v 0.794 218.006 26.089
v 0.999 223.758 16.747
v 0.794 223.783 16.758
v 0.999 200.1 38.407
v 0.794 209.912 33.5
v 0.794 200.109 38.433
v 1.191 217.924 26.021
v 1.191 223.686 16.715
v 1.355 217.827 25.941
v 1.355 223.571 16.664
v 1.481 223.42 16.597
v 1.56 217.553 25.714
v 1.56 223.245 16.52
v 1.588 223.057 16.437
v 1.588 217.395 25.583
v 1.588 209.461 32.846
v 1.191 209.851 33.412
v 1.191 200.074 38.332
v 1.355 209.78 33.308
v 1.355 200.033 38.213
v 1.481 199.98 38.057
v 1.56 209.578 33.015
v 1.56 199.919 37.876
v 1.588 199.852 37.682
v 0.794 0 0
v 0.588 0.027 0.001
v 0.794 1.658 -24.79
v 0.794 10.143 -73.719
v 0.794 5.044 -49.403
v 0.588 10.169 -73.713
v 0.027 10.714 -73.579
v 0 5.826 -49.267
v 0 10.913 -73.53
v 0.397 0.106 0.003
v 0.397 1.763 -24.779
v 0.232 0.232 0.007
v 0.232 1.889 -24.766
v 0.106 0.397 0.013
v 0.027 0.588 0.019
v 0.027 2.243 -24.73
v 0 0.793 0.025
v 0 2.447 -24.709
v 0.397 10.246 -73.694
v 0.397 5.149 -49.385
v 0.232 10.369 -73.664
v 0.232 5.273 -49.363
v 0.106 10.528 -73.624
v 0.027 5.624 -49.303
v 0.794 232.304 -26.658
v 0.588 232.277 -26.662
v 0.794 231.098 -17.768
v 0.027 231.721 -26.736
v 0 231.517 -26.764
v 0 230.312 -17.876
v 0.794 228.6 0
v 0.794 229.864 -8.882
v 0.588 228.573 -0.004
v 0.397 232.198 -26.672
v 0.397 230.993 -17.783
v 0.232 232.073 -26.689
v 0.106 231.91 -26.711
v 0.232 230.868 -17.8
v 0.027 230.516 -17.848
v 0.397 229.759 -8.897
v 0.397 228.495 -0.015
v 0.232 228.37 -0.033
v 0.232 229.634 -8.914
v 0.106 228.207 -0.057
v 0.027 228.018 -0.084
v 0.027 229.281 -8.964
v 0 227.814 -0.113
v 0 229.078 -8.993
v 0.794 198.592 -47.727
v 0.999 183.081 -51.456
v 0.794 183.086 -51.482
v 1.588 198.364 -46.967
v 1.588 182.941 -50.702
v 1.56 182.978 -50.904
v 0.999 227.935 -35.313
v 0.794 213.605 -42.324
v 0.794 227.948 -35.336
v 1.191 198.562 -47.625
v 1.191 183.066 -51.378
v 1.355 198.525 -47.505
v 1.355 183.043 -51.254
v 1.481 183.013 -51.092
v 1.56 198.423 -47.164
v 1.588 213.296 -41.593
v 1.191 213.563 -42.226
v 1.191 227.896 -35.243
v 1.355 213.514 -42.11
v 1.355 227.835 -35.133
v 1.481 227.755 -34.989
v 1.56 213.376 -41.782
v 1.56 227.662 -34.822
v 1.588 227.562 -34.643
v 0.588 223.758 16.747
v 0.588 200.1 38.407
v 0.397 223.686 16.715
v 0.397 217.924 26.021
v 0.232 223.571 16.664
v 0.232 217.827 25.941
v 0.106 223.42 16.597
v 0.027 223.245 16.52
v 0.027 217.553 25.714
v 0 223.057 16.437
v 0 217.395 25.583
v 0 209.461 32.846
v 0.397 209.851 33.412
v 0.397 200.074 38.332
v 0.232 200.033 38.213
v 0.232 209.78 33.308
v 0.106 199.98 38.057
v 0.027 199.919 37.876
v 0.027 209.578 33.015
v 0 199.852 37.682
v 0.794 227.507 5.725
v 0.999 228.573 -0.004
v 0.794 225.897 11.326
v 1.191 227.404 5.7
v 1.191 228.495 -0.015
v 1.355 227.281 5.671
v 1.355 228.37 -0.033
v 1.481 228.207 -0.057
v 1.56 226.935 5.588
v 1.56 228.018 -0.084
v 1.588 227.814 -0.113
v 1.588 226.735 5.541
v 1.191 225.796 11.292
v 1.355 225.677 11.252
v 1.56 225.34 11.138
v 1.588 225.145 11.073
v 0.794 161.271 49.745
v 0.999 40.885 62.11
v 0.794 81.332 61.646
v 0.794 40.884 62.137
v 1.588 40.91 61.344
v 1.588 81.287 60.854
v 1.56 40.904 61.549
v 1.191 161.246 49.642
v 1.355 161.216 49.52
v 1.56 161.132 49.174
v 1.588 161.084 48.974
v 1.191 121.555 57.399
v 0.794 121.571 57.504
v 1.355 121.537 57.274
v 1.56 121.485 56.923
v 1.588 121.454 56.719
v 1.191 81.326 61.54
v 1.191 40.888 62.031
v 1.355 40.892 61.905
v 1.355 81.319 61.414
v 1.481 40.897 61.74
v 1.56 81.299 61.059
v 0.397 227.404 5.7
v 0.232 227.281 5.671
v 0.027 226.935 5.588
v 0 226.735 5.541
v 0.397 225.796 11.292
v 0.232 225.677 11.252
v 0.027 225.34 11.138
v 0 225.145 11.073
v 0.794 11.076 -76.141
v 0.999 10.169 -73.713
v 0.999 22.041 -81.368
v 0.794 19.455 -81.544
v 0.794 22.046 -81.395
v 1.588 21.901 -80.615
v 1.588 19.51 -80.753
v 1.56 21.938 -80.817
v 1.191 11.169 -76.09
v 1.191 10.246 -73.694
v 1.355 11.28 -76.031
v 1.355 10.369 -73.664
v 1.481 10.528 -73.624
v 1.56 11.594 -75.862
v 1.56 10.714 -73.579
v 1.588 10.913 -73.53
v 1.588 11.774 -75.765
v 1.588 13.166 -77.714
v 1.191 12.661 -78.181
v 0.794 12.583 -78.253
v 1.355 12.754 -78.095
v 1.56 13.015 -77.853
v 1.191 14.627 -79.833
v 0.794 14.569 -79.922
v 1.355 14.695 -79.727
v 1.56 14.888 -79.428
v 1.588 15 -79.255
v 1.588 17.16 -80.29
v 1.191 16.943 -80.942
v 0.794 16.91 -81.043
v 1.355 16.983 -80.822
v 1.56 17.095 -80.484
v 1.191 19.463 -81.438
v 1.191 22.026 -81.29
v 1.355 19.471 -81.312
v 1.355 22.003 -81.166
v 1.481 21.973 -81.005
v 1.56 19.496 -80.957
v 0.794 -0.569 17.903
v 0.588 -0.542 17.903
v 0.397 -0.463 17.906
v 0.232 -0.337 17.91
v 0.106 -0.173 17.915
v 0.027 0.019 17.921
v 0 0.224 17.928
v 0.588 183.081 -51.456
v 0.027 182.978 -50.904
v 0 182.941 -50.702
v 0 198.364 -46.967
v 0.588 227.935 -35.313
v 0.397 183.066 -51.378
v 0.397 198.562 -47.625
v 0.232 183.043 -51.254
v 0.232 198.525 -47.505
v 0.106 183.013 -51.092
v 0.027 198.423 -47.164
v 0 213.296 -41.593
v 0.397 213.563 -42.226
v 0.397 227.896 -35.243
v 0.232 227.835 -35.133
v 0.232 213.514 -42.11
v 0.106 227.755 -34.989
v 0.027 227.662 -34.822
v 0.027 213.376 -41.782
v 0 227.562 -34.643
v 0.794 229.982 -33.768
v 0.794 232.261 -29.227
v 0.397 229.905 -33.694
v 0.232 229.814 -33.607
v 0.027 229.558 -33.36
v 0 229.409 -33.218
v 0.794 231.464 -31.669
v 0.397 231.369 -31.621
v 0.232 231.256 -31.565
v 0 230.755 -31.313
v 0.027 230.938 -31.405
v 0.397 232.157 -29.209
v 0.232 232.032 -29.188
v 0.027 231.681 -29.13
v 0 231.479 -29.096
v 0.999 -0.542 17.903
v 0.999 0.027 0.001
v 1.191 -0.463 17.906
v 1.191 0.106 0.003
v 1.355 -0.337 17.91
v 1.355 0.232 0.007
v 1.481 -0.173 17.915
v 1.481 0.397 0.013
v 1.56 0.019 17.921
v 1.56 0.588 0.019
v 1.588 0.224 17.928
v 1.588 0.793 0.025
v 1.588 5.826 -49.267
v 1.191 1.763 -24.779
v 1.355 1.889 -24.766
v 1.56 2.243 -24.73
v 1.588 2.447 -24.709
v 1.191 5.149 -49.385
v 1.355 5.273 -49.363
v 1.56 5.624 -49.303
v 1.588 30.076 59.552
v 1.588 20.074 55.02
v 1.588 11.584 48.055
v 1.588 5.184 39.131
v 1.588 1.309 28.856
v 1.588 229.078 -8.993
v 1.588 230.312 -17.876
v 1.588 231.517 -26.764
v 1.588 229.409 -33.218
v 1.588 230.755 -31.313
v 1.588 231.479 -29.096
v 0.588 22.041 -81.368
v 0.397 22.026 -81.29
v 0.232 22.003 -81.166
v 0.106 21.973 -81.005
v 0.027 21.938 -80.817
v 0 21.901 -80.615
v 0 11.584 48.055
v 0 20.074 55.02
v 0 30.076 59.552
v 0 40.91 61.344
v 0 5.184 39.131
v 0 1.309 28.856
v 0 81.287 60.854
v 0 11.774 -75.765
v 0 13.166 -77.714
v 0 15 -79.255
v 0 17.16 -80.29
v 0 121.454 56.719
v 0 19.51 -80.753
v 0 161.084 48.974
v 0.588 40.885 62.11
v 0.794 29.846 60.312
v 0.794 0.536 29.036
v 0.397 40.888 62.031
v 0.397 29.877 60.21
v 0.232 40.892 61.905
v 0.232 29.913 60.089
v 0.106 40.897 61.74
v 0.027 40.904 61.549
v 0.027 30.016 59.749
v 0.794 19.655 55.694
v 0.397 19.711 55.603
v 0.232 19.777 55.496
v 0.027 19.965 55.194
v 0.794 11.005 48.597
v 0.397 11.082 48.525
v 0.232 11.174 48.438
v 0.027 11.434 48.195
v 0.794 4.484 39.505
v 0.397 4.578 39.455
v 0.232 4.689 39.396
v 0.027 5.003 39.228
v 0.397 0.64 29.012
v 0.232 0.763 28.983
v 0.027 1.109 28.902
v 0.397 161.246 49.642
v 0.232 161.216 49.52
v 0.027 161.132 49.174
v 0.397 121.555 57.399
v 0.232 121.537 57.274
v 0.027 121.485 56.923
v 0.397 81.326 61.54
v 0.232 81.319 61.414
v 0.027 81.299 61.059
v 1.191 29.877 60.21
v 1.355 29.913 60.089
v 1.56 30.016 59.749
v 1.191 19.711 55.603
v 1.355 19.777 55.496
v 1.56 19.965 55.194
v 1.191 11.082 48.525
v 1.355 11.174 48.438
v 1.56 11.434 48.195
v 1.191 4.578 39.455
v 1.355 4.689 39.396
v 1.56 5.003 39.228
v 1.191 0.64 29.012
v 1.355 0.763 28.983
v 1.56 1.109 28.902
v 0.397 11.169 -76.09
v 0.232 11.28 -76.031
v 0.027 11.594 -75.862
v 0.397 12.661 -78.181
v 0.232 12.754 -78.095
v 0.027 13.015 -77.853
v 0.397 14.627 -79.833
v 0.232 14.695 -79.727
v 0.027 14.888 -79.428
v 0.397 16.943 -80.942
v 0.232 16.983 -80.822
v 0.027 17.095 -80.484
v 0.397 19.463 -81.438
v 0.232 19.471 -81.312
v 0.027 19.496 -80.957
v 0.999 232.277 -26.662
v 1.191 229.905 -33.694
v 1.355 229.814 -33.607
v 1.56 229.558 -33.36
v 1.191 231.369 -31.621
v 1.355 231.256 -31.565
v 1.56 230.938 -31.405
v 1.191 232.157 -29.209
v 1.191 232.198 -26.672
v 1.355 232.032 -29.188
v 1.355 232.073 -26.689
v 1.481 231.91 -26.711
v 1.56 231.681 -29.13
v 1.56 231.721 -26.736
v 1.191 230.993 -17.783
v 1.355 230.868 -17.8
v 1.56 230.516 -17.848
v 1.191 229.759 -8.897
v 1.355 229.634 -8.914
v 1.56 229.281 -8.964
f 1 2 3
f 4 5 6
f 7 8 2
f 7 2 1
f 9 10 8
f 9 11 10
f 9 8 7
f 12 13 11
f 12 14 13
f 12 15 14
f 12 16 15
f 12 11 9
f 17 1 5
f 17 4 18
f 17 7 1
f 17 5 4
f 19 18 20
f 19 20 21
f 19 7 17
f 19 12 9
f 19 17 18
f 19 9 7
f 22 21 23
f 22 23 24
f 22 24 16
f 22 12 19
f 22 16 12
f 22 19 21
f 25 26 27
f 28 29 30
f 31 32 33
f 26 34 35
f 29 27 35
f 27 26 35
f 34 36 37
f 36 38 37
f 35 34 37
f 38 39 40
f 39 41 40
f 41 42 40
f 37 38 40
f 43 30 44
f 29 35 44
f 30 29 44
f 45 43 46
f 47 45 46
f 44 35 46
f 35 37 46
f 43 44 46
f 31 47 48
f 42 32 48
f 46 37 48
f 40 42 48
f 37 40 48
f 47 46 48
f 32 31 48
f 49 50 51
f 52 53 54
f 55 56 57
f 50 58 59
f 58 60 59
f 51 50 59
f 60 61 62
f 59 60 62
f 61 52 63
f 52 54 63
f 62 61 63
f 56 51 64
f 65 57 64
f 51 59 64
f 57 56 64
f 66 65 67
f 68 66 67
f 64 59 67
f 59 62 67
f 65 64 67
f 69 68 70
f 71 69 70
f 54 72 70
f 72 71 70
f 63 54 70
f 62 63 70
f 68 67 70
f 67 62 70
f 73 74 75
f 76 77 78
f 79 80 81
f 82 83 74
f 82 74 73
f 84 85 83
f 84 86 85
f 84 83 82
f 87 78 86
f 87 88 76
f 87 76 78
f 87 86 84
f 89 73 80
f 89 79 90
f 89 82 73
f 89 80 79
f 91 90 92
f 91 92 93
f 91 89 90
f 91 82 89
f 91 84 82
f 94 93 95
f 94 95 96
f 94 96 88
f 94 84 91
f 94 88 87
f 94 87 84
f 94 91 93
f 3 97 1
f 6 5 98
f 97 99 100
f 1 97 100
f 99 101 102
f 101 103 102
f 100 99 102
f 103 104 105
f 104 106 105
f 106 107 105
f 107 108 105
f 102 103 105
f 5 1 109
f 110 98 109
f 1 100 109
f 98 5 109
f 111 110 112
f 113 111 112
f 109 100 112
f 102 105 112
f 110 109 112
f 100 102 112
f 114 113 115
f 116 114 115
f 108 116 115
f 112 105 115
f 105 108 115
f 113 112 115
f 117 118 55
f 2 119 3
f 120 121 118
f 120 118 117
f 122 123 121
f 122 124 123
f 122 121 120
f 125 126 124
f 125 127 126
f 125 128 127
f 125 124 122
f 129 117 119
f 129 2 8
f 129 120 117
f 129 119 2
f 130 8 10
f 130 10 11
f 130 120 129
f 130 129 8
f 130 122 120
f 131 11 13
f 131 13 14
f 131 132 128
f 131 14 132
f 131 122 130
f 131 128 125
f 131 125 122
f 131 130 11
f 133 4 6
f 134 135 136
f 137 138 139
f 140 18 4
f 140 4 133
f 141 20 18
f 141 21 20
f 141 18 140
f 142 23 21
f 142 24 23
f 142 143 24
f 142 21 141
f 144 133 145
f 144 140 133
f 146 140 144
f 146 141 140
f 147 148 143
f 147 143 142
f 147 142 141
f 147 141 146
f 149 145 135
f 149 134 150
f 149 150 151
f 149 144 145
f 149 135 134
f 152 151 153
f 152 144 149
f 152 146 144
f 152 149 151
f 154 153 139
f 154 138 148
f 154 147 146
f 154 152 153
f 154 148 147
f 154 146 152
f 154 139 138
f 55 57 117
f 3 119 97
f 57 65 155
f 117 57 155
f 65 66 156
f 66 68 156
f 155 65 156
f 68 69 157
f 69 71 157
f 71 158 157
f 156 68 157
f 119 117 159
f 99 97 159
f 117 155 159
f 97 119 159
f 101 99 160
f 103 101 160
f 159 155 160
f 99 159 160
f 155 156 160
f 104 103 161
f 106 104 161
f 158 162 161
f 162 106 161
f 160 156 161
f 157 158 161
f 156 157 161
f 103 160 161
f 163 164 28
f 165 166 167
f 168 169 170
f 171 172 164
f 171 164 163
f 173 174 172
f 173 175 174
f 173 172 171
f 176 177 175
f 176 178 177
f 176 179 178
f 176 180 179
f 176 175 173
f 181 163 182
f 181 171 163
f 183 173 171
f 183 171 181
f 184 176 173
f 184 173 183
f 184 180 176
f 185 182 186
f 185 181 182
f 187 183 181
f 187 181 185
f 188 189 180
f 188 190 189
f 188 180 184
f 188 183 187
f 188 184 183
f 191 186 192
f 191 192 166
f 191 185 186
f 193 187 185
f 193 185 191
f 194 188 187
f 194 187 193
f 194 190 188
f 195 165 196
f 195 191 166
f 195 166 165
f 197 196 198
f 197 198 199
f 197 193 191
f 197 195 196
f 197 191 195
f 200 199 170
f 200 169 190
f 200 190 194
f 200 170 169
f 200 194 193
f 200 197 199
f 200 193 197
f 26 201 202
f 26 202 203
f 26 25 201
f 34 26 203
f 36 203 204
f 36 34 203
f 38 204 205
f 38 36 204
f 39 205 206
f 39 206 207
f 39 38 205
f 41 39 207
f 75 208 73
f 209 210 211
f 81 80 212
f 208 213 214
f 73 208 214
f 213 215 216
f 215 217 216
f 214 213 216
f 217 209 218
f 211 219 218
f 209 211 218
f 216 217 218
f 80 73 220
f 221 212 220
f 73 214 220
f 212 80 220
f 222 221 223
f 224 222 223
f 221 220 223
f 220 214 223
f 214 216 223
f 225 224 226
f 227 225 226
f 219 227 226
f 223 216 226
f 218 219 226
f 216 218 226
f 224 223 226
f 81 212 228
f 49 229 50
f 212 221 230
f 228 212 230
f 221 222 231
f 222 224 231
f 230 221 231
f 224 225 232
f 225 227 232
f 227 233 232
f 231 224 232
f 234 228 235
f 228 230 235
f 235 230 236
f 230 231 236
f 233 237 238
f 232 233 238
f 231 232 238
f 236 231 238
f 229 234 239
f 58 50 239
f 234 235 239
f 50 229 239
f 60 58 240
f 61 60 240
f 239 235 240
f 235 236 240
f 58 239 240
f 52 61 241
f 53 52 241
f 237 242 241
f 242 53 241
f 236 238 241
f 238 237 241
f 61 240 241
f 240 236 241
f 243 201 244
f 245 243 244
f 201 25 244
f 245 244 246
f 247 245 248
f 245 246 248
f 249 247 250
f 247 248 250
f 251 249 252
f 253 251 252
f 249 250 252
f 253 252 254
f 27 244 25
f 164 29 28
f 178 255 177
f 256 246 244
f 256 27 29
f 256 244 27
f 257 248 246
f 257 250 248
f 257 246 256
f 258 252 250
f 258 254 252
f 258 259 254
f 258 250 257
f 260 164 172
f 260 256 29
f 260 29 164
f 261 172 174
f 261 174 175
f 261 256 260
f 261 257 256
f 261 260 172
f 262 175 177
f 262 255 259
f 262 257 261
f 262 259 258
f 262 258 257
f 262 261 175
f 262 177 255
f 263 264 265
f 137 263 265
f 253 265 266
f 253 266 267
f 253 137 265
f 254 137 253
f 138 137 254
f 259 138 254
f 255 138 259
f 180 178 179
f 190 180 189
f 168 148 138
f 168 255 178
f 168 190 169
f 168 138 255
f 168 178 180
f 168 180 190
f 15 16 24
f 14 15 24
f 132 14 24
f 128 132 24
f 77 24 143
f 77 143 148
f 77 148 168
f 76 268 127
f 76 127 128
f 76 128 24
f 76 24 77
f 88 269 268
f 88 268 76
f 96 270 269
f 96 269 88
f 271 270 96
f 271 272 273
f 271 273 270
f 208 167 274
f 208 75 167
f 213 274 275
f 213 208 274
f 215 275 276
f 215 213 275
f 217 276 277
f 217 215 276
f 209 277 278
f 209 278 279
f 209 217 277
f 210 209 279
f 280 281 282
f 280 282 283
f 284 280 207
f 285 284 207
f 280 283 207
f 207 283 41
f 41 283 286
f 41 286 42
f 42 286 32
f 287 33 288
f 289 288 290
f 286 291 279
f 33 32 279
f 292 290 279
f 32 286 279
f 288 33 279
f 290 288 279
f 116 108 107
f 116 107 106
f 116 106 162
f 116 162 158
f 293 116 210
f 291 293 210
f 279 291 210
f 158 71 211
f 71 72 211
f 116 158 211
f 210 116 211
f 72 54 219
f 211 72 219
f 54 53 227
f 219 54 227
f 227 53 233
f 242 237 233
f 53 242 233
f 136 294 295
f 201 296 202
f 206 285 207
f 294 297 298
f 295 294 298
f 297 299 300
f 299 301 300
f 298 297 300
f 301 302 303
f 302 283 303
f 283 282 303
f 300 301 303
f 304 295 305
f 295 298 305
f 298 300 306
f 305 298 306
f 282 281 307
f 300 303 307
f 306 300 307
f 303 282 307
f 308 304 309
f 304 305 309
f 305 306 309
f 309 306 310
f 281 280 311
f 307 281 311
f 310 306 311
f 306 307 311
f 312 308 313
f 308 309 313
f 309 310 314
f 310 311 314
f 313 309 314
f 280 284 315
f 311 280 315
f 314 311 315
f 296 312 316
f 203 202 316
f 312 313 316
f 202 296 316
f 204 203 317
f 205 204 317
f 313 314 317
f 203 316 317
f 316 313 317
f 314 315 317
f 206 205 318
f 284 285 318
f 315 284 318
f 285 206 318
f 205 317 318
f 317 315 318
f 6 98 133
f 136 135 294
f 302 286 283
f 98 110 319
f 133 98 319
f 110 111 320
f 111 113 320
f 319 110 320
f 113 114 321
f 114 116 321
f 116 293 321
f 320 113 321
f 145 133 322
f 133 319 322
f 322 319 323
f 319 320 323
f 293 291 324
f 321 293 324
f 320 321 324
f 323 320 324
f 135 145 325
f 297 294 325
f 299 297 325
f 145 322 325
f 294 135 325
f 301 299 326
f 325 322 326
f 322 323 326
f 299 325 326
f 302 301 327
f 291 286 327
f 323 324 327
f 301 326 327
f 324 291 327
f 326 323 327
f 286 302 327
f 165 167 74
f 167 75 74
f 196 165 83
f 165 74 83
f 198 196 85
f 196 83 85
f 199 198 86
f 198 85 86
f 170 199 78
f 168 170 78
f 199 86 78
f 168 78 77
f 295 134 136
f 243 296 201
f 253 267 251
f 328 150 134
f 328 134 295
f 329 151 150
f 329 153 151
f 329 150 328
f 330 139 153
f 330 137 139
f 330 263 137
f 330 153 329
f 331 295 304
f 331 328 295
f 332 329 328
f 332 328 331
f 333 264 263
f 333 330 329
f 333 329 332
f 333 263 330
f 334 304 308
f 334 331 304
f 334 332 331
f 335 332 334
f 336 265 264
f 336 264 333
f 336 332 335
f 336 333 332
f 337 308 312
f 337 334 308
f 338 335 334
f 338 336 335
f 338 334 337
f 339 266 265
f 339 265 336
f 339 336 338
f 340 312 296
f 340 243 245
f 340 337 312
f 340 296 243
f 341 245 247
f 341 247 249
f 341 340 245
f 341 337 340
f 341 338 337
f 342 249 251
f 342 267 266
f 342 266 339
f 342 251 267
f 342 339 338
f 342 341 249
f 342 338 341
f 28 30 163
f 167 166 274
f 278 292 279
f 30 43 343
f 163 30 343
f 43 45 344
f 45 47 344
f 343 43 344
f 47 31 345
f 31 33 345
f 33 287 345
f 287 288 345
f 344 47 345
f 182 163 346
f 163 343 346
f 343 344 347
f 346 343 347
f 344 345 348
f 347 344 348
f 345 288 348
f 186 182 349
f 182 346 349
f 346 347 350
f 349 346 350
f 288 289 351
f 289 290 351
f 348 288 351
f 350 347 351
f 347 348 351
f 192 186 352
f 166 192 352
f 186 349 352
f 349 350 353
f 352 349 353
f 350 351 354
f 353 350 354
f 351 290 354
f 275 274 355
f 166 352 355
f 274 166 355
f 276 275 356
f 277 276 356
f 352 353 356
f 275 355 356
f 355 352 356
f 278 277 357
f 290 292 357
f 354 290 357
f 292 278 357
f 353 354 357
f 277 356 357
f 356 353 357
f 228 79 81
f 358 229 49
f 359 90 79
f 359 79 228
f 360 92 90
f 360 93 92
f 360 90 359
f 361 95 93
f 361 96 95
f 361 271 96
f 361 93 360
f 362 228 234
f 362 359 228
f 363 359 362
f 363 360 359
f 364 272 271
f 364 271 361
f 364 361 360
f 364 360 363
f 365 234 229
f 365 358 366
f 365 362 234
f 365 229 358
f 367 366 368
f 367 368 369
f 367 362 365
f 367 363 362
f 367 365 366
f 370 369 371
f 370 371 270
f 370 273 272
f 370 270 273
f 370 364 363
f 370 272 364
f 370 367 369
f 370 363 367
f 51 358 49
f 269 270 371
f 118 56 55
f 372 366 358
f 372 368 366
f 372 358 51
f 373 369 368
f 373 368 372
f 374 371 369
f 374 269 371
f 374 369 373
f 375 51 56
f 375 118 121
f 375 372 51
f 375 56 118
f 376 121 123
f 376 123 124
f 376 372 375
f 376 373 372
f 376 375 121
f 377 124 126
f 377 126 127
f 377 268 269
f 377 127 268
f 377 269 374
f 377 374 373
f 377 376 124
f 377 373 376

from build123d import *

# Parameters (mm, degrees)
BOSS_EXTRUDE1_DEPTH = 1.5875
FILLET1_R           = 0.79375


with BuildPart() as part:
    # Sketch1 → Boss-Extrude1 (new body)
    with BuildSketch(Plane(origin=(0, 0, 0), x_dir=(0, 0, -1), z_dir=(1, 0, 0))):
        with BuildLine():
            Line((-17.902635187, -0.569374423), (0, 0))
            ThreePointArc((0, 0), (37.12605167, 3.135689948), (73.719447715, 10.142802762))
            ThreePointArc((73.719447715, 10.142802762), (79.921895168, 14.569472776), (81.394996501, 22.045817758))
            Line((81.394996501, 22.045817758), (51.482359978, 183.08555927))
            ThreePointArc((51.482359978, 183.08555927), (45.228157216, 206.171293063), (35.33630552, 227.947826924))
            ThreePointArc((35.33630552, 227.947826924), (31.668987667, 231.46398016), (26.65826502, 232.303749395))
            ThreePointArc((26.65826502, 232.303749395), (13.324550439, 230.484854806), (0, 228.6))
            ThreePointArc((0, 228.6), (-8.544073084, 226.765963851), (-16.757921757, 223.783085471))
            ThreePointArc((-16.757921757, 223.783085471), (-30.073107103, 214.214239464), (-38.432839733, 200.108501446))
            ThreePointArc((-38.432839733, 200.108501446), (-57.504393579, 121.571137315), (-62.136879452, 40.884200297))
            ThreePointArc((-62.136879452, 40.884200297), (-48.597224699, 11.004576546), (-17.902635187, -0.569374423))
        make_face()
    extrude(amount=BOSS_EXTRUDE1_DEPTH)

    # Fillet1
    fillet1_edges = [part.edges().sort_by_distance(p)[0] for p in [
        (0, 226.765963851, 8.544073084),
        (0, 230.484854806, -13.324550439),
        (0, 231.46398016, -31.668987667),
        (0, 206.171293063, -45.228157216),
        (0, 102.565688514, -66.438678239),
        (0, 14.569472776, -79.921895168),
        (0, 3.135689948, -37.12605167),
        (0, -0.284687211, 8.951317593),
        (0, 11.004576546, 48.597224699),
        (0, 121.571137315, 57.504393579),
        (1.5875, 214.214239464, 30.073107103),
        (1.5875, 226.765963851, 8.544073084),
        (1.5875, 230.484854806, -13.324550439),
        (1.5875, 231.46398016, -31.668987667),
        (1.5875, 206.171293063, -45.228157216),
        (1.5875, 102.565688514, -66.438678239),
        (1.5875, 14.569472776, -79.921895168),
        (1.5875, 3.135689948, -37.12605167),
        (1.5875, -0.284687211, 8.951317593),
        (1.5875, 11.004576546, 48.597224699),
        (0, 214.214239464, 30.073107103),
        (1.5875, 121.571137315, 57.504393579),
    ]]
    fillet(fillet1_edges, radius=FILLET1_R - 0.0001)  # a hair under: the kernel refuses the full size


solid = part.part
